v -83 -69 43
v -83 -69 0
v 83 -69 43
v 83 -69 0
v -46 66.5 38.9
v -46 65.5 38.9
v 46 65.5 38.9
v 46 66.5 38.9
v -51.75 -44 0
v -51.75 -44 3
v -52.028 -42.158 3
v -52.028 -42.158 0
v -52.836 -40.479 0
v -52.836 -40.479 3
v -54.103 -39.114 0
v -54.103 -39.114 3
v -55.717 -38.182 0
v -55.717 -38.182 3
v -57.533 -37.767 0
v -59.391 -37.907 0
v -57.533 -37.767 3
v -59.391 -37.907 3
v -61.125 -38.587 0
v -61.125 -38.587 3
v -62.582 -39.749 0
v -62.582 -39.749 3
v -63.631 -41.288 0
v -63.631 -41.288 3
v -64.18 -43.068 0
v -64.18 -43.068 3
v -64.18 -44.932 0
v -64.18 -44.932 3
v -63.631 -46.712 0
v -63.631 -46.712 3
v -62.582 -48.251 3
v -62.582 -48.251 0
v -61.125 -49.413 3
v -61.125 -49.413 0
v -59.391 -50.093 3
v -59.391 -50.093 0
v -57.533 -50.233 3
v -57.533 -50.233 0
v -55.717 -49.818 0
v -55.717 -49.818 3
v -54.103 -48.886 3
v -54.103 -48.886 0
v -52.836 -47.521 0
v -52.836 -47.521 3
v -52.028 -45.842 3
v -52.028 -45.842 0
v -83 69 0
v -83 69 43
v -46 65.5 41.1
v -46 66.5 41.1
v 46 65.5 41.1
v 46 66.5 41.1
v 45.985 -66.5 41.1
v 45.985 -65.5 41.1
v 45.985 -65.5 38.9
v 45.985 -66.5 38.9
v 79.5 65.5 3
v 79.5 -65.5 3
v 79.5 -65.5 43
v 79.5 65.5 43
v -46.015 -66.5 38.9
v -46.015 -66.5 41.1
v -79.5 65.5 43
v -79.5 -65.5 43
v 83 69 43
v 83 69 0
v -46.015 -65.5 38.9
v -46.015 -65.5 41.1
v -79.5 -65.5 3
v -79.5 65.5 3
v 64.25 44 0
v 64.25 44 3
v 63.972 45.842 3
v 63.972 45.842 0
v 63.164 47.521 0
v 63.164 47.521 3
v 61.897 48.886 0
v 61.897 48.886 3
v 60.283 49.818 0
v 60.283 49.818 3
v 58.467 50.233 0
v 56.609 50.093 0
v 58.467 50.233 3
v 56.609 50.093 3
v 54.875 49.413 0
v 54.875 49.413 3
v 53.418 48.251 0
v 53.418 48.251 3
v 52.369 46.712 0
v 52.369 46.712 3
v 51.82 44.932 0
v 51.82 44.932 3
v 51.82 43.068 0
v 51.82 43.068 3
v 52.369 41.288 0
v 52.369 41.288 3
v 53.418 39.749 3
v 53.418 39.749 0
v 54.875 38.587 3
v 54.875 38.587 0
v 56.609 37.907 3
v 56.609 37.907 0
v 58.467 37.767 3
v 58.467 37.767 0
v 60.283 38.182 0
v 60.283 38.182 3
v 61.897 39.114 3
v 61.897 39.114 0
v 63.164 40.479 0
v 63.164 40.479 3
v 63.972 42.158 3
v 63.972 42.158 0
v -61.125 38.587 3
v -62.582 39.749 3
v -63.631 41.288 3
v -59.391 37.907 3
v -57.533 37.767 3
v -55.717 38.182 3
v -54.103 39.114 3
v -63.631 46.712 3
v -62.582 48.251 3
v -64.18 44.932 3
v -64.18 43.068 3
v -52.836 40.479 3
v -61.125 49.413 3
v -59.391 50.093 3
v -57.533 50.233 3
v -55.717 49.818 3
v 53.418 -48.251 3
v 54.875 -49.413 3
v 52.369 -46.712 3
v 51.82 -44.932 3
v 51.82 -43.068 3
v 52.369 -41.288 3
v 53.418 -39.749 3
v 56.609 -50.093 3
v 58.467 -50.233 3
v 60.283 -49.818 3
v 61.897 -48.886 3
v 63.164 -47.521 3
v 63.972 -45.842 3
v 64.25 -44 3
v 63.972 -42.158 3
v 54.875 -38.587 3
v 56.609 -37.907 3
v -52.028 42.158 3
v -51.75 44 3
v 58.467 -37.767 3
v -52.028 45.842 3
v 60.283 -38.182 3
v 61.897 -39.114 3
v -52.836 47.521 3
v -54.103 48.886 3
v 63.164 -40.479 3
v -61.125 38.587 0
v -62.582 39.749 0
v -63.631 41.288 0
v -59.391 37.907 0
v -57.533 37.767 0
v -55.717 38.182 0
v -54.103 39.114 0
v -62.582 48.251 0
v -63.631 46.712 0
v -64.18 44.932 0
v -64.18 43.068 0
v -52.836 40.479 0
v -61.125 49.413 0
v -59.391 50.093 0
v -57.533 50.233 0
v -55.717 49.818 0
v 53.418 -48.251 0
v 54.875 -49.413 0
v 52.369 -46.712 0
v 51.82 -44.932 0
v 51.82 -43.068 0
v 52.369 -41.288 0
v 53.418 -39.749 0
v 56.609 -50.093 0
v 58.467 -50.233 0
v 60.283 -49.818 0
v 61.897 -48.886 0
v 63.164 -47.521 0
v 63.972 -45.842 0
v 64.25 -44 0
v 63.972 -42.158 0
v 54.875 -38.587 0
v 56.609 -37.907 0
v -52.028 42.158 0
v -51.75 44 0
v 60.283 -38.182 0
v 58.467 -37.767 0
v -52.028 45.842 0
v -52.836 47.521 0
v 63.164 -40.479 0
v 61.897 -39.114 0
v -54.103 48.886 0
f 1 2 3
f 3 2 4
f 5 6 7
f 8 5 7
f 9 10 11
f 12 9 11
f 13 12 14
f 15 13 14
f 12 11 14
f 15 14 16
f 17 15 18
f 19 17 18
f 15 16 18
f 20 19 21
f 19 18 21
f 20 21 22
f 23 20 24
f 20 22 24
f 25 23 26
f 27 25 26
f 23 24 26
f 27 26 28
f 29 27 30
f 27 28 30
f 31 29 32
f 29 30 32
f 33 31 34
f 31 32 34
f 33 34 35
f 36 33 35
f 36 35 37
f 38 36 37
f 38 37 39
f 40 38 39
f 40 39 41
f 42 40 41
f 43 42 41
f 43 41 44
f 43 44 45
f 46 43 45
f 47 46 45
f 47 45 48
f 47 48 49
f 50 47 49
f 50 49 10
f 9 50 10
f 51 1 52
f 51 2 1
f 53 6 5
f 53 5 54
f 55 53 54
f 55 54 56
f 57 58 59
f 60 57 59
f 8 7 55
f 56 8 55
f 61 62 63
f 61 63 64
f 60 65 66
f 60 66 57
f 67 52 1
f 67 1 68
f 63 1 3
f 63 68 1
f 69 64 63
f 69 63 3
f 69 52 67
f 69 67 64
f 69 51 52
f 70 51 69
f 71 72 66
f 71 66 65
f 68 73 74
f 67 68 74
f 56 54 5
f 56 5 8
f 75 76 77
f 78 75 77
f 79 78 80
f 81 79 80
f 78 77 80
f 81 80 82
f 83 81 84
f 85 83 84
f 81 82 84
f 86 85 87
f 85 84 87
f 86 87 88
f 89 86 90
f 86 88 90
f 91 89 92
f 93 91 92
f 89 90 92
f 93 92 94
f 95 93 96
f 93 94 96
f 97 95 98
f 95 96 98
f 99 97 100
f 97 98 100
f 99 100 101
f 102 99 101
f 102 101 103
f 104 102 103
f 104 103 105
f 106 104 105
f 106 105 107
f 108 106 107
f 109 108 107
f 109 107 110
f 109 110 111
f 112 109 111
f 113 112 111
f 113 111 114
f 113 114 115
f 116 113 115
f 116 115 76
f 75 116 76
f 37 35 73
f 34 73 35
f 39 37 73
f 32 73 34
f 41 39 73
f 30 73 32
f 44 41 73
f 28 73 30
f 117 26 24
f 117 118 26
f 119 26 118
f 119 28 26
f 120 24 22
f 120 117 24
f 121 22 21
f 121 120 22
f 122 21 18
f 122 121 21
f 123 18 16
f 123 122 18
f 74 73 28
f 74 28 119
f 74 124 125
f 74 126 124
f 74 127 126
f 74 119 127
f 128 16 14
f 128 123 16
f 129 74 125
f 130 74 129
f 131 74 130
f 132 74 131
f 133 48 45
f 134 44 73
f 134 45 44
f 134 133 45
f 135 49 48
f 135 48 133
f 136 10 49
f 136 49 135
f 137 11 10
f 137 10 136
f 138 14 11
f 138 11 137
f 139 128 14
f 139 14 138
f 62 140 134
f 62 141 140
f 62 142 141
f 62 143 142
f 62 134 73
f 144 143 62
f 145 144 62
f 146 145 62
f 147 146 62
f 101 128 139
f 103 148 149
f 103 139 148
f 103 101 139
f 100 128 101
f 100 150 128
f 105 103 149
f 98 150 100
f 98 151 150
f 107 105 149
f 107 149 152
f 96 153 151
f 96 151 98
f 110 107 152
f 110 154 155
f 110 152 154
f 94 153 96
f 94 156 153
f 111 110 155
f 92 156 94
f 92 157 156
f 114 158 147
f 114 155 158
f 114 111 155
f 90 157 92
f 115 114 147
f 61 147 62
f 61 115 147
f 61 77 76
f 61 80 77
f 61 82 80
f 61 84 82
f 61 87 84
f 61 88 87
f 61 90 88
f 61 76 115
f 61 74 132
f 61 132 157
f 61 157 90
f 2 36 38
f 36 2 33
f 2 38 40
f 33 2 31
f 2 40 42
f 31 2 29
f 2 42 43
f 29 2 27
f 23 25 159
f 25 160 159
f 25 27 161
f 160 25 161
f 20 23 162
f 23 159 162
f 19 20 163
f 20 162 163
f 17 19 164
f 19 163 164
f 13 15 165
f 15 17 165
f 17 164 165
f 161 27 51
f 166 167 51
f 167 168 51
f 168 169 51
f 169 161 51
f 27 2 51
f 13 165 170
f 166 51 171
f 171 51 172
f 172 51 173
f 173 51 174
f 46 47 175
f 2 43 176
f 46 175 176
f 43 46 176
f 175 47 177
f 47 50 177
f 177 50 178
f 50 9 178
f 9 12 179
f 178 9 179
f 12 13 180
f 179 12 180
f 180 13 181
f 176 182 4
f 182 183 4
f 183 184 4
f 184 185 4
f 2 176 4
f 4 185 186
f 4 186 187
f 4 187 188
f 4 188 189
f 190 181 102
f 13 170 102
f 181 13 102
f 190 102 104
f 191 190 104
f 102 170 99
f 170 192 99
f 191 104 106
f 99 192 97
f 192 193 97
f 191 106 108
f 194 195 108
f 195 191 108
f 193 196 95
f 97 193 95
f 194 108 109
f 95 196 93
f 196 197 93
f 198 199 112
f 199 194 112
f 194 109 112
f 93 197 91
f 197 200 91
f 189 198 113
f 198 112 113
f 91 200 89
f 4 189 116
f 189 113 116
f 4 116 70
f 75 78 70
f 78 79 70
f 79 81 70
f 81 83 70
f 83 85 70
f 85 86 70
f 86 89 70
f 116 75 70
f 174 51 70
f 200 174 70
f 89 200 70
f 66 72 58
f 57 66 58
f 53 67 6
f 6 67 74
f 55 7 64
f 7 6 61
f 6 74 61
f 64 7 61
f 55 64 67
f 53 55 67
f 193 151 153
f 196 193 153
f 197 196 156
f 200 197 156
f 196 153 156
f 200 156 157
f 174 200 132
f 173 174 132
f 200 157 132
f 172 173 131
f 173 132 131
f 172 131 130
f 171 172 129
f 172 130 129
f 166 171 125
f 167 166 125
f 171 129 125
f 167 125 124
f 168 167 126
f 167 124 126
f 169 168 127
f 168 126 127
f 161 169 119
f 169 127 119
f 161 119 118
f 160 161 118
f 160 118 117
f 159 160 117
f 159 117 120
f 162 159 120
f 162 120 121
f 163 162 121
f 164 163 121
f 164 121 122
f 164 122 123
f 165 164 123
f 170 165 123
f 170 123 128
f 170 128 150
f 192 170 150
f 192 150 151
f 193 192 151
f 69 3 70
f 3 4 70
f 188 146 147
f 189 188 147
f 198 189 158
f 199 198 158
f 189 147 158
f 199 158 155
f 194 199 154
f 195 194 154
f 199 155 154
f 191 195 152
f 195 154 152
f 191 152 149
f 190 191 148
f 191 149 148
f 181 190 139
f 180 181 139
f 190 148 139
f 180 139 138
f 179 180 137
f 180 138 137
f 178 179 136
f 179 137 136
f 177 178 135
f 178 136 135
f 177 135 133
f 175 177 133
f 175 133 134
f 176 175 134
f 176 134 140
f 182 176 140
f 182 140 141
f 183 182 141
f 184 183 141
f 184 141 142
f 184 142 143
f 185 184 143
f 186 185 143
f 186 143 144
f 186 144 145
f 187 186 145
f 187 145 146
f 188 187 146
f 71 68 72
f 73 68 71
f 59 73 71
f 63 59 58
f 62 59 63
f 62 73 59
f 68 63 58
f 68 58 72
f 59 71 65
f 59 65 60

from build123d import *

# Parameters (mm, degrees)
SKETCH_1_W          = 166
SKETCH_1_H          = 138
EXTRUDE_1_DEPTH     = 3
SKETCH_2_W          = 166
SKETCH_2_H          = 138
SKETCH_2_W_2        = 159
SKETCH_2_H_2        = 131
EXTRUDE_2_DEPTH     = 40
CUT_EXTRUDE_4_REACH = 117.109
SKETCH_3_R          = 6.25
SKETCH_4_W          = 92
SKETCH_4_H          = 2.2
CUT_EXTRUDE_5_DEPTH = 1
SKETCH_5_W          = 92
SKETCH_5_H          = 2.2
CUT_EXTRUDE_6_DEPTH = 1


with BuildPart() as part:
    # 스케치1 → 보스-돌출1 (new body)
    with BuildSketch(Plane.XY):
        Rectangle(SKETCH_1_W, SKETCH_1_H)
    extrude(amount=EXTRUDE_1_DEPTH)

    # 스케치2 → 보스-돌출2 (add)
    with BuildSketch(Plane.XY.offset(3)):
        Rectangle(SKETCH_2_W, SKETCH_2_H)
        Rectangle(SKETCH_2_W_2, SKETCH_2_H_2, mode=Mode.SUBTRACT)
    extrude(amount=EXTRUDE_2_DEPTH)

    # 스케치3 → 컷-돌출4 (cut, up to next)
    with BuildSketch(Plane.XY.offset(3), mode=Mode.PRIVATE) as cut_extrude_4_sk1:
        with Locations((-58, 44)):
            Circle(SKETCH_3_R)
    cut_extrude_4_tool1 = extrude(cut_extrude_4_sk1.sketch, amount=-CUT_EXTRUDE_4_REACH, mode=Mode.PRIVATE) & part.part
    # 스케치3 → 컷-돌출4 (cut, up to next)
    with BuildSketch(Plane.XY.offset(3), mode=Mode.PRIVATE) as cut_extrude_4_sk2:
        with Locations((-58, -44)):
            Circle(SKETCH_3_R)
    cut_extrude_4_tool2 = extrude(cut_extrude_4_sk2.sketch, amount=-CUT_EXTRUDE_4_REACH, mode=Mode.PRIVATE) & part.part
    # 스케치3 → 컷-돌출4 (cut, up to next)
    with BuildSketch(Plane.XY.offset(3), mode=Mode.PRIVATE) as cut_extrude_4_sk3:
        with Locations((58, -44)):
            Circle(SKETCH_3_R)
    cut_extrude_4_tool3 = extrude(cut_extrude_4_sk3.sketch, amount=-CUT_EXTRUDE_4_REACH, mode=Mode.PRIVATE) & part.part
    # 스케치3 → 컷-돌출4 (cut, up to next)
    with BuildSketch(Plane.XY.offset(3), mode=Mode.PRIVATE) as cut_extrude_4_sk4:
        with Locations((58, 44)):
            Circle(SKETCH_3_R)
    cut_extrude_4_tool4 = extrude(cut_extrude_4_sk4.sketch, amount=-CUT_EXTRUDE_4_REACH, mode=Mode.PRIVATE) & part.part
    add(cut_extrude_4_tool1.solids().sort_by_distance((-58, 44, 3))[0], mode=Mode.SUBTRACT)
    add(cut_extrude_4_tool2.solids().sort_by_distance((-58, -44, 3))[0], mode=Mode.SUBTRACT)
    add(cut_extrude_4_tool3.solids().sort_by_distance((58, -44, 3))[0], mode=Mode.SUBTRACT)
    add(cut_extrude_4_tool4.solids().sort_by_distance((58, 44, 3))[0], mode=Mode.SUBTRACT)

    # 스케치4 → 컷-돌출5 (cut)
    with BuildSketch(Plane.XZ.offset(-65.5)):
        with Locations((0, 40)):
            Rectangle(SKETCH_4_W, SKETCH_4_H)
    extrude(amount=-CUT_EXTRUDE_5_DEPTH, mode=Mode.SUBTRACT)

    # 스케치5 → 컷-돌출6 (cut)
    with BuildSketch(Plane(origin=(0, -65.5, 0), x_dir=(1, 0, 0), z_dir=(0, 1, 0))):
        with Locations((-0.014955436, -40)):
            Rectangle(SKETCH_5_W, SKETCH_5_H)
    extrude(amount=-CUT_EXTRUDE_6_DEPTH, mode=Mode.SUBTRACT)


solid = part.part
